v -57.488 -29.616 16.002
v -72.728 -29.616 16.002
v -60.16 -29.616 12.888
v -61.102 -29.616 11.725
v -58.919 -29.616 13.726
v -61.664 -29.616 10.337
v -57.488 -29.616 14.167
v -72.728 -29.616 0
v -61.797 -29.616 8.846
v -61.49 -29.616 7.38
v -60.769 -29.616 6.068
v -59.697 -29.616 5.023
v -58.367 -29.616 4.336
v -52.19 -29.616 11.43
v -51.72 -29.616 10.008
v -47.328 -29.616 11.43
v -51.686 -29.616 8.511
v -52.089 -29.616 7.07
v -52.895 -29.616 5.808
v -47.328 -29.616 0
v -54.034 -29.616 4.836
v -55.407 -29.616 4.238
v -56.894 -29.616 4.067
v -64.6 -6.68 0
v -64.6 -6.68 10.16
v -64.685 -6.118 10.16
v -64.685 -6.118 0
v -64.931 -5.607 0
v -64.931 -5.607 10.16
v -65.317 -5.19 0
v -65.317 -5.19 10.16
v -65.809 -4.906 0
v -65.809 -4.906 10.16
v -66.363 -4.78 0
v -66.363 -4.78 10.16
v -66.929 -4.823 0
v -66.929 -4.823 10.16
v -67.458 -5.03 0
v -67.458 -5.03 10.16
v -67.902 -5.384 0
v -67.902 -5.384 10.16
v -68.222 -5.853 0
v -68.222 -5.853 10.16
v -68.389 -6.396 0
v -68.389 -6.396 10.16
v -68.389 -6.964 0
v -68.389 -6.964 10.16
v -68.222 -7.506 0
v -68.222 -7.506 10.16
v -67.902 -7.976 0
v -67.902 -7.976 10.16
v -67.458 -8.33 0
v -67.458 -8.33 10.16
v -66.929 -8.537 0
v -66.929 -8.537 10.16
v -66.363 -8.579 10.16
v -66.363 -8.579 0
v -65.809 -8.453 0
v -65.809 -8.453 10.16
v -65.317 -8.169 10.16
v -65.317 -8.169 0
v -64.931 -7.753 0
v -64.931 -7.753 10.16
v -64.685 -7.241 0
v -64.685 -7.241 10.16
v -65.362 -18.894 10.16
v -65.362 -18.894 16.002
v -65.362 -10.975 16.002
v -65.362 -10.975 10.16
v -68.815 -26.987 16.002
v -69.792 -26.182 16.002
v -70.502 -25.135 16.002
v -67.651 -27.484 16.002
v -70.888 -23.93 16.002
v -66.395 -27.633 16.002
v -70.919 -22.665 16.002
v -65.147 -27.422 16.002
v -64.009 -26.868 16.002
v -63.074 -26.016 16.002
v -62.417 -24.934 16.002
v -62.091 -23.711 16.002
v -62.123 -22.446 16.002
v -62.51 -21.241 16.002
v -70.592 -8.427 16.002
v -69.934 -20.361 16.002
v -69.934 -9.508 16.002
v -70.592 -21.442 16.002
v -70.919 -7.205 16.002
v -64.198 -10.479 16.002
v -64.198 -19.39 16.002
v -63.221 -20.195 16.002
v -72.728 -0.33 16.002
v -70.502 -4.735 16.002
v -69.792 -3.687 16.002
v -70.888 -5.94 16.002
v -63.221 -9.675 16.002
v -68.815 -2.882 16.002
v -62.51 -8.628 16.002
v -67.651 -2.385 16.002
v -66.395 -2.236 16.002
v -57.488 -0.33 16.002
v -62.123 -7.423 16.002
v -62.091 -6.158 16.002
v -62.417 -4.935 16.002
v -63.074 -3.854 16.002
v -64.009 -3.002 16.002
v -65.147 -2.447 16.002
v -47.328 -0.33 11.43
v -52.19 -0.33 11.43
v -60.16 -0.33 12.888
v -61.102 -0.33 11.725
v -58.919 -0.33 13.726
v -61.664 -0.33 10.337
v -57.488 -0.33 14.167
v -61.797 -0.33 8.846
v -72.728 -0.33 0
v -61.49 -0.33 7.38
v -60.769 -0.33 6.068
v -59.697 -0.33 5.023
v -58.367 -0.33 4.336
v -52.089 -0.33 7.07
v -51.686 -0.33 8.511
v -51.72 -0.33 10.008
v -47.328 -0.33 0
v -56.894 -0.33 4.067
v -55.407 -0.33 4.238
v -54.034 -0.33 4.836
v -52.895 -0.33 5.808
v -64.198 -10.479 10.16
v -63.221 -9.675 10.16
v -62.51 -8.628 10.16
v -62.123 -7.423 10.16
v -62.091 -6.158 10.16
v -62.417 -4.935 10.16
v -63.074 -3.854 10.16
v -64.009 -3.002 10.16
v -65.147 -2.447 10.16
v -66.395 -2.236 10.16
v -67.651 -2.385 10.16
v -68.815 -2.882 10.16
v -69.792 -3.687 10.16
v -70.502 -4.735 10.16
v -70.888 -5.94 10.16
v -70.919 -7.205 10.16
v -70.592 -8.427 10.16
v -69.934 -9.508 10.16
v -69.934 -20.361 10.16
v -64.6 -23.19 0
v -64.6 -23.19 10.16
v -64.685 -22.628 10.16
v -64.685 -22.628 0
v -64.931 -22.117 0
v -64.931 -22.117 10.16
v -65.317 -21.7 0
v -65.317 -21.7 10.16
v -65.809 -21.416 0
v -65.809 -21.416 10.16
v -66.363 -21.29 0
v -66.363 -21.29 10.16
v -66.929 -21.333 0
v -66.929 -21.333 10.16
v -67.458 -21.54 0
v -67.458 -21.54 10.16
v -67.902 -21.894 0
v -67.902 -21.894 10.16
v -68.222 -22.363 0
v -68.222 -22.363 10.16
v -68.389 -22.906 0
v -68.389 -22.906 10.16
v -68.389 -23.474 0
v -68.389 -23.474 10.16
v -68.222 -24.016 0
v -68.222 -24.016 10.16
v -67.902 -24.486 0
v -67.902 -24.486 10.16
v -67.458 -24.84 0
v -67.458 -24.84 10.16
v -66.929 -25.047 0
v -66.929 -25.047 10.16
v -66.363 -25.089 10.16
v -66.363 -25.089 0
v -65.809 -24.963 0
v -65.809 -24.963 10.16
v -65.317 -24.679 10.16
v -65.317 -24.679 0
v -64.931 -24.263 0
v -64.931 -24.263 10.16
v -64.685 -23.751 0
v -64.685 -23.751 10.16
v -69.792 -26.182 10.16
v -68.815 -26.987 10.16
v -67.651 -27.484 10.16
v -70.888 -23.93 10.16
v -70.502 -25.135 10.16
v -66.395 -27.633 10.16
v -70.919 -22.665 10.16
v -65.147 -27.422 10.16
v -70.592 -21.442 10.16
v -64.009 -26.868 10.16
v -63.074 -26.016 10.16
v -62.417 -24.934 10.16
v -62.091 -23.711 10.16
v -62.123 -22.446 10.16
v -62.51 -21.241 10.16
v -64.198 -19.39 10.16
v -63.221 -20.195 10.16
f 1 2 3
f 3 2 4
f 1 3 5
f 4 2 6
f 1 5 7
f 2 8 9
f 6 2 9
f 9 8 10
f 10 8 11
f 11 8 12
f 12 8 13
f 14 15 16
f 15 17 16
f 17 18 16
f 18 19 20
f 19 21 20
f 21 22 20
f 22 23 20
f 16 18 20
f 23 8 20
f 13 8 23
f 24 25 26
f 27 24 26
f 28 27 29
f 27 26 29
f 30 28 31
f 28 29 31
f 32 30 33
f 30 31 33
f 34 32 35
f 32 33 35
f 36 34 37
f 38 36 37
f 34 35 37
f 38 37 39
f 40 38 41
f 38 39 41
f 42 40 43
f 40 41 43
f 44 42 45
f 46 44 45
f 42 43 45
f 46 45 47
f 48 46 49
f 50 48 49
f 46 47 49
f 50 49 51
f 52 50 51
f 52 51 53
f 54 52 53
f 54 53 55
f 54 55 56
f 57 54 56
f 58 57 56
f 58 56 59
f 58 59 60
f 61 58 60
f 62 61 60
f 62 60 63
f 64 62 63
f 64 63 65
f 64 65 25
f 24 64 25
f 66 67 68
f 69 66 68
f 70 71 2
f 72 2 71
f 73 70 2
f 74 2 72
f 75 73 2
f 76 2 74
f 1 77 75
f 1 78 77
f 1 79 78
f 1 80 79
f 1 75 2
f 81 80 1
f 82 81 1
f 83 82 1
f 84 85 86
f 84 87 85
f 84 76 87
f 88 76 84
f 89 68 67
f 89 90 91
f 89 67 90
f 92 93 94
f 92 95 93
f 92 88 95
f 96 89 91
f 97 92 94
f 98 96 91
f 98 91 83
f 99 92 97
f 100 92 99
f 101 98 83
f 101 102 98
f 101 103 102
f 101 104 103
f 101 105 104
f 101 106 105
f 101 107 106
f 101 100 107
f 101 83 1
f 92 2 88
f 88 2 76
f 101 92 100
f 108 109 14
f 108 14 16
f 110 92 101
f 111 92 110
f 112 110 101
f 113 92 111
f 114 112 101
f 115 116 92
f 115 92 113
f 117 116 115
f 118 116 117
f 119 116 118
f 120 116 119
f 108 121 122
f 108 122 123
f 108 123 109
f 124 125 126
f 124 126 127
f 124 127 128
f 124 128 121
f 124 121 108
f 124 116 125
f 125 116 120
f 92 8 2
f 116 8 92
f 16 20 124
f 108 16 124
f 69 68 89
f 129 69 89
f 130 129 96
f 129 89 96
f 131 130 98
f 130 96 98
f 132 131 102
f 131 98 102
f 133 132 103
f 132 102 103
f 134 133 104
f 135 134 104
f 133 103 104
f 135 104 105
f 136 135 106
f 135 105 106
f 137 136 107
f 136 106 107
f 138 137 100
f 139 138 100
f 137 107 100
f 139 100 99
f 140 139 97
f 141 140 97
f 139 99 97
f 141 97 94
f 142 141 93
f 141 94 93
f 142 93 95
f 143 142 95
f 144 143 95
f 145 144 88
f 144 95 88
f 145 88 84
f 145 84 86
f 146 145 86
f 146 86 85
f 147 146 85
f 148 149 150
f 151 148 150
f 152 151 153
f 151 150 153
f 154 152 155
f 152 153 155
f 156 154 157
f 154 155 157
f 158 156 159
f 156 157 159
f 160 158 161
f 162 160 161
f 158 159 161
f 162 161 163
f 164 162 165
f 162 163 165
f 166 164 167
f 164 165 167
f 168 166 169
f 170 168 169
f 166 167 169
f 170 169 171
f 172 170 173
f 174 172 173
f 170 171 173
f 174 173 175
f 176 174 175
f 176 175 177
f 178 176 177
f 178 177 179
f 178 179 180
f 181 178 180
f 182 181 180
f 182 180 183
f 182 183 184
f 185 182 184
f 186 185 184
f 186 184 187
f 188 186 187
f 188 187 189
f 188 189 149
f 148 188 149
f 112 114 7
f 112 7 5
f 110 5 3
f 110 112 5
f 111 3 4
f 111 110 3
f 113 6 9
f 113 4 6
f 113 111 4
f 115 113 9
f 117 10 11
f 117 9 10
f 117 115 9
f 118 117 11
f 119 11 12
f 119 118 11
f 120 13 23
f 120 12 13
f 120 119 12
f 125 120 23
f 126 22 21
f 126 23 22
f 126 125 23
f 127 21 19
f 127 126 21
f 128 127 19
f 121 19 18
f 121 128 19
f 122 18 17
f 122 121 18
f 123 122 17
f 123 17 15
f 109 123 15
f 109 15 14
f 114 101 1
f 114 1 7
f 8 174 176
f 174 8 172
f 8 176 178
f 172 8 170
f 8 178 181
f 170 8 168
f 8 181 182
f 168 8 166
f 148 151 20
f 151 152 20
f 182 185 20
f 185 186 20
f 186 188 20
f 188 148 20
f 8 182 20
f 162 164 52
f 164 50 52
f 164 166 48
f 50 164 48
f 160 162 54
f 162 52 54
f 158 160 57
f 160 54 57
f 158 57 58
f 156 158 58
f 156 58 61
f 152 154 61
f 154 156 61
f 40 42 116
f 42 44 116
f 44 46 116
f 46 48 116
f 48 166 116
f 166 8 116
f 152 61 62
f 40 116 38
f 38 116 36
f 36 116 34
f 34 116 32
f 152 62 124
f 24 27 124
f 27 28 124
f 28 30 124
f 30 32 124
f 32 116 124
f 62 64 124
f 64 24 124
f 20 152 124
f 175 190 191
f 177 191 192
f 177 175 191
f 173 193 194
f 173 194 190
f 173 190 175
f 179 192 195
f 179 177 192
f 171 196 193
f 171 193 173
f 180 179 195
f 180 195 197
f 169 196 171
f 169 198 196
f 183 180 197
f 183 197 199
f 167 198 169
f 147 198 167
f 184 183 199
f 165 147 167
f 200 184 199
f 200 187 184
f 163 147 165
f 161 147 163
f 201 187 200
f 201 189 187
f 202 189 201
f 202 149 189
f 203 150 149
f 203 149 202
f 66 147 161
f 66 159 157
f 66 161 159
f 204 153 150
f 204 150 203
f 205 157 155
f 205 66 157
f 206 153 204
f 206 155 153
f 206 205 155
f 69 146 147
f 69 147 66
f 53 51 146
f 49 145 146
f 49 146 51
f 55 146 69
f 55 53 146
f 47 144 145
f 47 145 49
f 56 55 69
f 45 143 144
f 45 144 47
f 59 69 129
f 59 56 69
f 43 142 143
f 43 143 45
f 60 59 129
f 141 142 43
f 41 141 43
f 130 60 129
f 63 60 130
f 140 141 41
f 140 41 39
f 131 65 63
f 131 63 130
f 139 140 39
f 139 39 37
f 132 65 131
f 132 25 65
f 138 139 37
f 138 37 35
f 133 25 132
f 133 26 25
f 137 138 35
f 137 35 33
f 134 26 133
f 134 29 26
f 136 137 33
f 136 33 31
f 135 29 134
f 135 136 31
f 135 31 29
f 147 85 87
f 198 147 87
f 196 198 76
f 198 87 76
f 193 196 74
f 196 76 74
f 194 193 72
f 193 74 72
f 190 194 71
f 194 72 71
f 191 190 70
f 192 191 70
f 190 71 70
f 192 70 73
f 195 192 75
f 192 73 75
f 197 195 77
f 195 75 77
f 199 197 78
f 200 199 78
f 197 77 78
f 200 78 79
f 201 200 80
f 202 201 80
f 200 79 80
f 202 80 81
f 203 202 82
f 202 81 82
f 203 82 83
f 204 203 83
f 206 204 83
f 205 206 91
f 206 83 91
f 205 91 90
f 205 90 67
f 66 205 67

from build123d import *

# Parameters (mm, degrees)
SKETCH1_W           = 25.4
SKETCH1_H           = 29.2862
BOSS_EXTRUDE1_DEPTH = 16.002
CUT_EXTRUDE1_DEPTH  = 5.842
SKETCH3_R           = 1.905
CUT_EXTRUDE2_DEPTH  = 80.18158073
CUT_EXTRUDE3_DEPTH  = 81.01960028


with BuildPart() as part:
    # Sketch1 → Boss-Extrude1 (new body)
    with BuildSketch(Plane.XY):
        with Locations((-60.028198895, -14.972879006)):
            Rectangle(SKETCH1_W, SKETCH1_H)
    extrude(amount=BOSS_EXTRUDE1_DEPTH)

    # Sketch2 → Cut-Extrude1 (cut)
    with BuildSketch(Plane.XY.offset(16.002)):
        with BuildLine():
            Line((-69.934198895, -9.508203302), (-69.934198895, -20.361354709))
            ThreePointArc((-69.934198895, -20.361354709), (-65.147057291, -27.422210503), (-65.362198895, -18.894249236))
            Line((-65.362198895, -18.894249236), (-65.362198895, -10.975308775))
            ThreePointArc((-65.362198895, -10.975308775), (-65.147057291, -2.447347508), (-69.934198895, -9.508203302))
        make_face()
    extrude(amount=-CUT_EXTRUDE1_DEPTH, mode=Mode.SUBTRACT)

    # Sketch3 → Cut-Extrude2 (cut, through all)
    with BuildSketch(Plane.XY.offset(10.16)):
        with Locations((-66.505198895, -6.679779006)):
            Circle(SKETCH3_R)
        with Locations((-66.505198895, -23.189779006)):
            Circle(SKETCH3_R)
    extrude(amount=-CUT_EXTRUDE2_DEPTH, mode=Mode.SUBTRACT)

    # Sketch4 → Cut-Extrude3 (cut, through all)
    with BuildSketch(Plane(origin=(0, -0.329779006, 0), x_dir=(1, 0, 0), z_dir=(0, 1, 0))):
        with BuildLine():
            Line((-57.488198895, -16.002), (-57.488198895, -14.166524863))
            ThreePointArc((-57.488198895, -14.166524863), (-59.057296313, -4.63042217), (-52.189613836, -11.43))
            Line((-52.189613836, -11.43), (-47.328198895, -11.43))
            Line((-47.328198895, -11.43), (-47.328198895, -16.002))
            Line((-47.328198895, -16.002), (-57.488198895, -16.002))
        make_face()
    extrude(amount=-CUT_EXTRUDE3_DEPTH, mode=Mode.SUBTRACT)


solid = part.part
